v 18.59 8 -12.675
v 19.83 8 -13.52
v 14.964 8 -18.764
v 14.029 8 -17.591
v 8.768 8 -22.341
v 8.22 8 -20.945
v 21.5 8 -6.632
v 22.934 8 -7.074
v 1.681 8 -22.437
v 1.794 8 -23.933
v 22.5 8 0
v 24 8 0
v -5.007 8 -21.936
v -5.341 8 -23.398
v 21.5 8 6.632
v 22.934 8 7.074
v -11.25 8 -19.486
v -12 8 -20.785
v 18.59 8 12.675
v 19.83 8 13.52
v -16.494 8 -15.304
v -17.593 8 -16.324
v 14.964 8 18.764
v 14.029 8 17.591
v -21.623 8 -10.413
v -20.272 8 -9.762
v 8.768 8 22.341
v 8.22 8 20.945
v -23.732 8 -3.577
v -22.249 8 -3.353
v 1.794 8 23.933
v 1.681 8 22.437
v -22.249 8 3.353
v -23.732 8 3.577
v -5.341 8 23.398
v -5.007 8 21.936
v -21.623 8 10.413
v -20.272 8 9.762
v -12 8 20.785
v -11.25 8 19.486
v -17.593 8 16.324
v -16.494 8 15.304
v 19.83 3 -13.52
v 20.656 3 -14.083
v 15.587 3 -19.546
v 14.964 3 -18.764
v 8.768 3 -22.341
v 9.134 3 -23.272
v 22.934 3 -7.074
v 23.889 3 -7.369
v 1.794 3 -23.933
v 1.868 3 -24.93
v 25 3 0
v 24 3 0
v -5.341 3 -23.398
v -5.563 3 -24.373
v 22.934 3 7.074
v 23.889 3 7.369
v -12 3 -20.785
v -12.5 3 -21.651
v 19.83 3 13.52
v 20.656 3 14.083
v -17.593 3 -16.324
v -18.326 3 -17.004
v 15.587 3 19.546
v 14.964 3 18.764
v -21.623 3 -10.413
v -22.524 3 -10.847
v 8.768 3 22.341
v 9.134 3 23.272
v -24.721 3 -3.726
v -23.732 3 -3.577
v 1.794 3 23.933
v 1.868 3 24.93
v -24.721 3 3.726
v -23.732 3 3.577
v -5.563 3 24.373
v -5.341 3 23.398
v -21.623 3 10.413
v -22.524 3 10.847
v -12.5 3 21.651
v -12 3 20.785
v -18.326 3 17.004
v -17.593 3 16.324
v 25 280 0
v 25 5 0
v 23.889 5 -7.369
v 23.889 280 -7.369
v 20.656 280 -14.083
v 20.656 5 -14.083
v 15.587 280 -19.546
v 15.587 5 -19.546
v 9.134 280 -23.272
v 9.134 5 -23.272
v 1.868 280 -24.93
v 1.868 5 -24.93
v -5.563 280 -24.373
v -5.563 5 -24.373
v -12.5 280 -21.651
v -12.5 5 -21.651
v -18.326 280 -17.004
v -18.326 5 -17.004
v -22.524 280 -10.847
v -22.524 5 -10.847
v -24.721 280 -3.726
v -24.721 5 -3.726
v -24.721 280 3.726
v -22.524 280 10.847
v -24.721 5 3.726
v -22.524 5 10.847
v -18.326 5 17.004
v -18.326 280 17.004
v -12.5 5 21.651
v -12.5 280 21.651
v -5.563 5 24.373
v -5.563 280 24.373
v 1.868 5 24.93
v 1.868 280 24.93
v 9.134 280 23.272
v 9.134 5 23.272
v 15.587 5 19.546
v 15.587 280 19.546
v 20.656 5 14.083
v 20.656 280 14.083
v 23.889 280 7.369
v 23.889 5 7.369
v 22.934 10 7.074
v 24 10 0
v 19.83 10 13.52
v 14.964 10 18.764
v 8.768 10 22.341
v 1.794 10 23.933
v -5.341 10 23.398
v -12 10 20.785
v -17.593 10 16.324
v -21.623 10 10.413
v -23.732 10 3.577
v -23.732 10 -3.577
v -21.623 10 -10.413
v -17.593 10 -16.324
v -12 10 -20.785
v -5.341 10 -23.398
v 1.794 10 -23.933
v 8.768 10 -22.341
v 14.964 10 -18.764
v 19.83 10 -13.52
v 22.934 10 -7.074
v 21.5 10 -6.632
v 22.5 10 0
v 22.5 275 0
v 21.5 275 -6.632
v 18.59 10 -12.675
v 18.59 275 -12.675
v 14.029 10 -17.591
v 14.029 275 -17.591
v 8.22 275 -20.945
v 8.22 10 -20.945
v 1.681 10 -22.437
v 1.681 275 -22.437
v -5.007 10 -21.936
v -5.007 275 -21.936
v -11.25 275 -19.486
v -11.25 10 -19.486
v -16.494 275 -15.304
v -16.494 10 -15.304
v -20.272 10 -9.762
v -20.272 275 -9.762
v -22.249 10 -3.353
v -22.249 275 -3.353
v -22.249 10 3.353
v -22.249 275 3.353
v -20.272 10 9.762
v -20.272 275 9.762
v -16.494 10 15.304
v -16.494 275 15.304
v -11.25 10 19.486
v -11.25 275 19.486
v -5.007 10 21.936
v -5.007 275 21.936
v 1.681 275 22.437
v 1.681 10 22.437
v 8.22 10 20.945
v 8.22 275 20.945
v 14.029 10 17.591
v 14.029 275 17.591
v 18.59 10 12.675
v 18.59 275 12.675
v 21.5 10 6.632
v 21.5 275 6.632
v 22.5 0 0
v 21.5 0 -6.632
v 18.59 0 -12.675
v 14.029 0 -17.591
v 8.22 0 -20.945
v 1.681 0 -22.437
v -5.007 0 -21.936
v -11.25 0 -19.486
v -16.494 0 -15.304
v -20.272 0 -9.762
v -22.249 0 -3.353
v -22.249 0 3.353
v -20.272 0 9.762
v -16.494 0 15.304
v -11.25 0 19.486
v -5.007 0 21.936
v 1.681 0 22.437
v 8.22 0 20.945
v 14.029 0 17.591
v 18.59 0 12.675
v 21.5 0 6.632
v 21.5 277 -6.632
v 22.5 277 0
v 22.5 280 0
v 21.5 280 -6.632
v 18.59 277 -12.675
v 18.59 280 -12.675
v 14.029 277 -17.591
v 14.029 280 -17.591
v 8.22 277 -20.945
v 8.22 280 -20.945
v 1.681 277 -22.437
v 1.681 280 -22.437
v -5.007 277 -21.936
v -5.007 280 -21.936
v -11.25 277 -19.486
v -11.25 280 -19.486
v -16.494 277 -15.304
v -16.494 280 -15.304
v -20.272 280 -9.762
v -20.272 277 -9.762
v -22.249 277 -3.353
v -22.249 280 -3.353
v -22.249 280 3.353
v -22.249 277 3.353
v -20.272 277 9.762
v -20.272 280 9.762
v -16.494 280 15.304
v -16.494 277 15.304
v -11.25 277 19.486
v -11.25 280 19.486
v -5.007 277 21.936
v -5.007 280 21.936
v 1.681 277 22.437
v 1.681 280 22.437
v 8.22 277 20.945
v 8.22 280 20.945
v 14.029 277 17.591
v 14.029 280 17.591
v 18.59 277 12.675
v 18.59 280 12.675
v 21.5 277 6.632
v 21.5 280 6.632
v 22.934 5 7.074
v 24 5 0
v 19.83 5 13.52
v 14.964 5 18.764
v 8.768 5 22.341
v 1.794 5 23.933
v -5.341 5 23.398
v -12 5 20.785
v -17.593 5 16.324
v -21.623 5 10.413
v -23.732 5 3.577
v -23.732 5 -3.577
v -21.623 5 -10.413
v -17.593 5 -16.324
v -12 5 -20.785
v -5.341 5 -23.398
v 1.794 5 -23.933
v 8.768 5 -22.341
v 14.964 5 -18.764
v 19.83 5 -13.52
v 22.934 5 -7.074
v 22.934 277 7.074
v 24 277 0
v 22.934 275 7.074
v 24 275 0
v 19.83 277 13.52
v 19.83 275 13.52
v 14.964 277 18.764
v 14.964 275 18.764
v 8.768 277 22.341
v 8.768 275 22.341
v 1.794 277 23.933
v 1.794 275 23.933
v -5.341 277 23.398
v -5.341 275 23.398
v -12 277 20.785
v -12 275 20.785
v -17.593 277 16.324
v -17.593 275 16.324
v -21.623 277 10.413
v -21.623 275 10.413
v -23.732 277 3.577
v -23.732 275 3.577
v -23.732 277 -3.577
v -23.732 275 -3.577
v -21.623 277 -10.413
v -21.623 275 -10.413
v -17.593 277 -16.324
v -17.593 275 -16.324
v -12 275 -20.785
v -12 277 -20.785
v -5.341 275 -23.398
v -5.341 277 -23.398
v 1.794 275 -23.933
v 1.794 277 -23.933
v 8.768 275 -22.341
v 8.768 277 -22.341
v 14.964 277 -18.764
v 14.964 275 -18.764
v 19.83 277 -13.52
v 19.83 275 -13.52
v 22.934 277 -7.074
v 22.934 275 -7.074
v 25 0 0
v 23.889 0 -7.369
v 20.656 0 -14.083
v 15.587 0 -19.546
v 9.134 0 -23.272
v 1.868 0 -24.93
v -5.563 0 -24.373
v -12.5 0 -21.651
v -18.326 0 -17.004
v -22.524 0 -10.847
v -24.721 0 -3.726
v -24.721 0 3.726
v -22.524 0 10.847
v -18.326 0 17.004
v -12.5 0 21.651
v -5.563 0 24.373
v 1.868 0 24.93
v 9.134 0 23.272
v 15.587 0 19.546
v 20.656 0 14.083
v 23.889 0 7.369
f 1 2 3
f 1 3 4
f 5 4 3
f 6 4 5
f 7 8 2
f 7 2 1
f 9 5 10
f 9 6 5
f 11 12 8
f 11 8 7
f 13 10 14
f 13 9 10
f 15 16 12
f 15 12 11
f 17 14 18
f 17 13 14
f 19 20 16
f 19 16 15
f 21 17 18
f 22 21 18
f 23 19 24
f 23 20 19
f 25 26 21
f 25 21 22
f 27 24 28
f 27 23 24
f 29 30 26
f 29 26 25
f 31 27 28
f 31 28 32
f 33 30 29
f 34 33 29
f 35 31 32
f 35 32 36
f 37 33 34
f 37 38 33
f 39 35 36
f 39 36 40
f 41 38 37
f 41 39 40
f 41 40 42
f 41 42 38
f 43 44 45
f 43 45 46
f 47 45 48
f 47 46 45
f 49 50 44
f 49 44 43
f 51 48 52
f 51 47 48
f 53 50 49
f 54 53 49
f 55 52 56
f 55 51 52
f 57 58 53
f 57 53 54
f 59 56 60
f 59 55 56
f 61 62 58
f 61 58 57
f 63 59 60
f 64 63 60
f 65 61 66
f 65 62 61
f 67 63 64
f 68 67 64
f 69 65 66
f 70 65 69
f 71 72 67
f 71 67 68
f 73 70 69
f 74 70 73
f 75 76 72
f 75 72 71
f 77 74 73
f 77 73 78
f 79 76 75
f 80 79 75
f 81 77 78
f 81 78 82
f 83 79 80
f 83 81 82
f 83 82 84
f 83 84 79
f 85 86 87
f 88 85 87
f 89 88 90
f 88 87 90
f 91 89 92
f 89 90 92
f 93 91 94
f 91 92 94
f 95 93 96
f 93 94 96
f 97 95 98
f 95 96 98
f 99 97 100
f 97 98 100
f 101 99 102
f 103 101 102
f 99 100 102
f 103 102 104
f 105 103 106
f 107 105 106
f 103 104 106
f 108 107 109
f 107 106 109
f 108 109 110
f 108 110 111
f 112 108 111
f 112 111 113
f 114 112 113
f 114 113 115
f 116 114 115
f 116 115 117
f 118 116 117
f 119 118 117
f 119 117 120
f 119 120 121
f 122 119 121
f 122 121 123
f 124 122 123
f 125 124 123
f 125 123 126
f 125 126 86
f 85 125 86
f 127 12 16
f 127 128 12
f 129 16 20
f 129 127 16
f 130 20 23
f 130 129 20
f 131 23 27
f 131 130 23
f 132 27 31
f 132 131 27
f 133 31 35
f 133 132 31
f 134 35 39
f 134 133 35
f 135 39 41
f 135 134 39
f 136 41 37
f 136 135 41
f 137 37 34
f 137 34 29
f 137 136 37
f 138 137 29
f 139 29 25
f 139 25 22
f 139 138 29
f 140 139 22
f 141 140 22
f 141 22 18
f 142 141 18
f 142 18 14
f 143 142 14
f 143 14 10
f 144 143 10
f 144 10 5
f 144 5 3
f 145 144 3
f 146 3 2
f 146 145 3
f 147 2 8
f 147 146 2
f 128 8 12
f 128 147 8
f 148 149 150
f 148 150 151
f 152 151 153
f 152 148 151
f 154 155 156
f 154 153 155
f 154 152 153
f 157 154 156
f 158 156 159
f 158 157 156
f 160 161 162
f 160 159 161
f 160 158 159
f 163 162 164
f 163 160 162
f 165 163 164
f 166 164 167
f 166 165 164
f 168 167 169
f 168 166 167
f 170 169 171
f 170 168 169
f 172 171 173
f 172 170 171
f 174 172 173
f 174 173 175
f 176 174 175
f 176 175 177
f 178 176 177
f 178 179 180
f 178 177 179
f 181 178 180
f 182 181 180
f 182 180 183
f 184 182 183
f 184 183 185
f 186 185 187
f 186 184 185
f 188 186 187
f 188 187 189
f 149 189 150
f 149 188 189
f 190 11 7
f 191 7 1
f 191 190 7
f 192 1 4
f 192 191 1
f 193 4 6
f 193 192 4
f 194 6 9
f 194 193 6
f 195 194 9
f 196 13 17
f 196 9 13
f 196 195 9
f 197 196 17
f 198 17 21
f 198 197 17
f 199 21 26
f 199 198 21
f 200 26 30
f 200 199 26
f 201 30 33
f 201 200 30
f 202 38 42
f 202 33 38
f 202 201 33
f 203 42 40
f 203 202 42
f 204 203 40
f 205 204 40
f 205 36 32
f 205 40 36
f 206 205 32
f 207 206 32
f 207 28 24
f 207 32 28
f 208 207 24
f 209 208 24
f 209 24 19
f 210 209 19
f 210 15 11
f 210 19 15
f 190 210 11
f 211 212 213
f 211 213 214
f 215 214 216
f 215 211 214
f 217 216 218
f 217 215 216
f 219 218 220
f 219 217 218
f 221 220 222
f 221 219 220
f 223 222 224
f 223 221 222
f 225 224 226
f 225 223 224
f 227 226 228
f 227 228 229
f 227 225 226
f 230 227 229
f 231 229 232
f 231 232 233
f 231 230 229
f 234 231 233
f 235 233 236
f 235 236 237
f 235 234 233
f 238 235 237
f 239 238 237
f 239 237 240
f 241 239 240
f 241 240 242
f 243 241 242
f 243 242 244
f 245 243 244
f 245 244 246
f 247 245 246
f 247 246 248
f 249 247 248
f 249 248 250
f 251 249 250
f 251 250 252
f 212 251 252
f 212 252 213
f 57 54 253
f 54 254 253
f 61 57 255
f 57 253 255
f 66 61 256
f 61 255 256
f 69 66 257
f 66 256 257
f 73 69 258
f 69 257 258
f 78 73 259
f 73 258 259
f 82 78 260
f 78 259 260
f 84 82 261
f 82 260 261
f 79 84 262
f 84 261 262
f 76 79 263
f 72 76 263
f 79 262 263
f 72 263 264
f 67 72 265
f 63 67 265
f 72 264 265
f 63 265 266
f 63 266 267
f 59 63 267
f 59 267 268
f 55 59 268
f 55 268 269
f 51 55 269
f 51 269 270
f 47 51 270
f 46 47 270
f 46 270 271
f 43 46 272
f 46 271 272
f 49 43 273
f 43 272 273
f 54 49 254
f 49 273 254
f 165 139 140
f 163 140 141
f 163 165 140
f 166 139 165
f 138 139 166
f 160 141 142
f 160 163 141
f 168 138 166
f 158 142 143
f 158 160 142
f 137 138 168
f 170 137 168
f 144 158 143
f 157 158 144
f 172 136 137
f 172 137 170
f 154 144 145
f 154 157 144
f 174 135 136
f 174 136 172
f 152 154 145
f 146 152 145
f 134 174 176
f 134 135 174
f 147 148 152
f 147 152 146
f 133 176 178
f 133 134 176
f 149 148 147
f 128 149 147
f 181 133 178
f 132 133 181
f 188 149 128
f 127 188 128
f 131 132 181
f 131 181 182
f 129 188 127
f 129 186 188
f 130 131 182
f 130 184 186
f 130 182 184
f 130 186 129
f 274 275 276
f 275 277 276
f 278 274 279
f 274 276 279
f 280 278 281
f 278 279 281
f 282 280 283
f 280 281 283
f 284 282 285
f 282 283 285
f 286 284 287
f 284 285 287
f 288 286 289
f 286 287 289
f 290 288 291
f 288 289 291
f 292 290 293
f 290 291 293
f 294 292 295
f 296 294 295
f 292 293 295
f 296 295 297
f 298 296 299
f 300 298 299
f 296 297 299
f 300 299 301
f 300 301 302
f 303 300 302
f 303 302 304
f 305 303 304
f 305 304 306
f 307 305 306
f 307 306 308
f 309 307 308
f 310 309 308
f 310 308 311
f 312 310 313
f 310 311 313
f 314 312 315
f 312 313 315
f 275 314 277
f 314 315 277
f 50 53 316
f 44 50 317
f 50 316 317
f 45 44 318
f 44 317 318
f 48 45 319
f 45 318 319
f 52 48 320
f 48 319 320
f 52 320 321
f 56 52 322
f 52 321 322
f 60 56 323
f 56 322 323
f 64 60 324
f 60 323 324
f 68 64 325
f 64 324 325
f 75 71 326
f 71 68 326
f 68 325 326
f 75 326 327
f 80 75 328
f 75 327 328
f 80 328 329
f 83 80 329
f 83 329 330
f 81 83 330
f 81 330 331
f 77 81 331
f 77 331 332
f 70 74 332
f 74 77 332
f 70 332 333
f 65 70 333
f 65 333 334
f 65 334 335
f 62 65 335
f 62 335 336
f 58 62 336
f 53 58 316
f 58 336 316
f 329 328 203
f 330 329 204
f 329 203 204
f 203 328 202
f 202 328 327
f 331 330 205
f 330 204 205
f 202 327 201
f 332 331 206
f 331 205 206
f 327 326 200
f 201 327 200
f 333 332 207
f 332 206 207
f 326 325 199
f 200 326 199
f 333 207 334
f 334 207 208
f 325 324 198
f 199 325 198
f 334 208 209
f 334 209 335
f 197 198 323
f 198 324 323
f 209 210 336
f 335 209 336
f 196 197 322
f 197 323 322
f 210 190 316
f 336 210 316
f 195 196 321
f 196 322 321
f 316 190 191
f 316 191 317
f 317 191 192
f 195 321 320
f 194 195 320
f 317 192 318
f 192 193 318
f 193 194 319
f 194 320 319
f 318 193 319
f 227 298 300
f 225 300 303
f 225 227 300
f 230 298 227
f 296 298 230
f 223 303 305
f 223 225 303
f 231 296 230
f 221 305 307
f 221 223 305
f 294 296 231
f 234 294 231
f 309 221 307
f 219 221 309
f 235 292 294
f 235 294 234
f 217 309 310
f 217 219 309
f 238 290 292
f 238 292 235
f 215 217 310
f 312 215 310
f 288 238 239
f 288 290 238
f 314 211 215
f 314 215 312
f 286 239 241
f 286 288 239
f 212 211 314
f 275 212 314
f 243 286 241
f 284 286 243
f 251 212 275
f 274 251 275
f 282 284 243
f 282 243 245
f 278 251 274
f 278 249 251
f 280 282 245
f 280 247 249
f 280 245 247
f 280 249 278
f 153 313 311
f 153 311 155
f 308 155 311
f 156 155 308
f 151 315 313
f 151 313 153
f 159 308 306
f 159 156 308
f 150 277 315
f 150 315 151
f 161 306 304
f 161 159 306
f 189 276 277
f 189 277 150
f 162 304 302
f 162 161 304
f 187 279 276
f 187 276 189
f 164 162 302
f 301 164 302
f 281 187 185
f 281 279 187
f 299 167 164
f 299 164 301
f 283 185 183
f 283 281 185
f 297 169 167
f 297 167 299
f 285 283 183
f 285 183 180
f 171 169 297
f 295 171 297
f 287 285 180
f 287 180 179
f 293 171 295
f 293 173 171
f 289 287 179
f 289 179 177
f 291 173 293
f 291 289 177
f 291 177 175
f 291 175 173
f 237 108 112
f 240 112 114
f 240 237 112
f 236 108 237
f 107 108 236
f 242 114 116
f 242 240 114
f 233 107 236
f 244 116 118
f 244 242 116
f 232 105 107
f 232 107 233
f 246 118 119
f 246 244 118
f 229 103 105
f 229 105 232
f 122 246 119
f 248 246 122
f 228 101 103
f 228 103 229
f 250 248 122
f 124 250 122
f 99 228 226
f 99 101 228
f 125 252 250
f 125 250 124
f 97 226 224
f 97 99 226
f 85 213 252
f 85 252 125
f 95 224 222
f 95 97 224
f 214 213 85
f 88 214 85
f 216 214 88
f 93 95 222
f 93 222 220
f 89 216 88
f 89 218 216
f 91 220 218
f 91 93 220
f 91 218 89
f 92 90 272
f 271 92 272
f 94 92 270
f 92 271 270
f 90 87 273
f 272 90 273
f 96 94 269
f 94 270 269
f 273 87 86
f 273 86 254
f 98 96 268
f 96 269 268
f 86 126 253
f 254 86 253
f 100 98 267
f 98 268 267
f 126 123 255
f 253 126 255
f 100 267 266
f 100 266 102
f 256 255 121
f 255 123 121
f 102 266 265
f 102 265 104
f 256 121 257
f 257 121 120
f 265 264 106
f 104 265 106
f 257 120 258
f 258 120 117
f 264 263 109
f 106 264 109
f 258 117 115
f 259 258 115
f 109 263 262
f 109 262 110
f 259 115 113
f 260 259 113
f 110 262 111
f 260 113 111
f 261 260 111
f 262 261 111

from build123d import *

# Parameters (mm, degrees)
SKETCH1_R           = 25
SKETCH1_R_2         = 22.5
BOSS_EXTRUDE1_DEPTH = 280


with BuildPart() as part:
    # Sketch1 → Boss-Extrude1 (new body)
    with BuildSketch(Plane(origin=(0, 0, 0), x_dir=(1, 0, 0), z_dir=(0, 1, 0))):
        Circle(SKETCH1_R)
        Circle(SKETCH1_R_2, mode=Mode.SUBTRACT)
    extrude(amount=BOSS_EXTRUDE1_DEPTH)

    # Sketch2 → Cut-Revolve1 (revolve, cut)
    with BuildSketch(Plane.XY):
        Polygon((24, 275), (22.5, 275), (22.157069883, 275), (22.157069883, 277), (22.5, 277), (24, 277), align=None)
        Polygon((22.5, 8), (24, 8), (24, 10), (21.749142676, 10), (21.749142676, 8), align=None)
        Polygon((25, 3), (24, 3), (24, 5), (25.376612155, 5), (25.376612155, 3), align=None)
    revolve(axis=Axis((0, 307.21500467, 0), (0, -1, 0)), mode=Mode.SUBTRACT)


solid = part.part
